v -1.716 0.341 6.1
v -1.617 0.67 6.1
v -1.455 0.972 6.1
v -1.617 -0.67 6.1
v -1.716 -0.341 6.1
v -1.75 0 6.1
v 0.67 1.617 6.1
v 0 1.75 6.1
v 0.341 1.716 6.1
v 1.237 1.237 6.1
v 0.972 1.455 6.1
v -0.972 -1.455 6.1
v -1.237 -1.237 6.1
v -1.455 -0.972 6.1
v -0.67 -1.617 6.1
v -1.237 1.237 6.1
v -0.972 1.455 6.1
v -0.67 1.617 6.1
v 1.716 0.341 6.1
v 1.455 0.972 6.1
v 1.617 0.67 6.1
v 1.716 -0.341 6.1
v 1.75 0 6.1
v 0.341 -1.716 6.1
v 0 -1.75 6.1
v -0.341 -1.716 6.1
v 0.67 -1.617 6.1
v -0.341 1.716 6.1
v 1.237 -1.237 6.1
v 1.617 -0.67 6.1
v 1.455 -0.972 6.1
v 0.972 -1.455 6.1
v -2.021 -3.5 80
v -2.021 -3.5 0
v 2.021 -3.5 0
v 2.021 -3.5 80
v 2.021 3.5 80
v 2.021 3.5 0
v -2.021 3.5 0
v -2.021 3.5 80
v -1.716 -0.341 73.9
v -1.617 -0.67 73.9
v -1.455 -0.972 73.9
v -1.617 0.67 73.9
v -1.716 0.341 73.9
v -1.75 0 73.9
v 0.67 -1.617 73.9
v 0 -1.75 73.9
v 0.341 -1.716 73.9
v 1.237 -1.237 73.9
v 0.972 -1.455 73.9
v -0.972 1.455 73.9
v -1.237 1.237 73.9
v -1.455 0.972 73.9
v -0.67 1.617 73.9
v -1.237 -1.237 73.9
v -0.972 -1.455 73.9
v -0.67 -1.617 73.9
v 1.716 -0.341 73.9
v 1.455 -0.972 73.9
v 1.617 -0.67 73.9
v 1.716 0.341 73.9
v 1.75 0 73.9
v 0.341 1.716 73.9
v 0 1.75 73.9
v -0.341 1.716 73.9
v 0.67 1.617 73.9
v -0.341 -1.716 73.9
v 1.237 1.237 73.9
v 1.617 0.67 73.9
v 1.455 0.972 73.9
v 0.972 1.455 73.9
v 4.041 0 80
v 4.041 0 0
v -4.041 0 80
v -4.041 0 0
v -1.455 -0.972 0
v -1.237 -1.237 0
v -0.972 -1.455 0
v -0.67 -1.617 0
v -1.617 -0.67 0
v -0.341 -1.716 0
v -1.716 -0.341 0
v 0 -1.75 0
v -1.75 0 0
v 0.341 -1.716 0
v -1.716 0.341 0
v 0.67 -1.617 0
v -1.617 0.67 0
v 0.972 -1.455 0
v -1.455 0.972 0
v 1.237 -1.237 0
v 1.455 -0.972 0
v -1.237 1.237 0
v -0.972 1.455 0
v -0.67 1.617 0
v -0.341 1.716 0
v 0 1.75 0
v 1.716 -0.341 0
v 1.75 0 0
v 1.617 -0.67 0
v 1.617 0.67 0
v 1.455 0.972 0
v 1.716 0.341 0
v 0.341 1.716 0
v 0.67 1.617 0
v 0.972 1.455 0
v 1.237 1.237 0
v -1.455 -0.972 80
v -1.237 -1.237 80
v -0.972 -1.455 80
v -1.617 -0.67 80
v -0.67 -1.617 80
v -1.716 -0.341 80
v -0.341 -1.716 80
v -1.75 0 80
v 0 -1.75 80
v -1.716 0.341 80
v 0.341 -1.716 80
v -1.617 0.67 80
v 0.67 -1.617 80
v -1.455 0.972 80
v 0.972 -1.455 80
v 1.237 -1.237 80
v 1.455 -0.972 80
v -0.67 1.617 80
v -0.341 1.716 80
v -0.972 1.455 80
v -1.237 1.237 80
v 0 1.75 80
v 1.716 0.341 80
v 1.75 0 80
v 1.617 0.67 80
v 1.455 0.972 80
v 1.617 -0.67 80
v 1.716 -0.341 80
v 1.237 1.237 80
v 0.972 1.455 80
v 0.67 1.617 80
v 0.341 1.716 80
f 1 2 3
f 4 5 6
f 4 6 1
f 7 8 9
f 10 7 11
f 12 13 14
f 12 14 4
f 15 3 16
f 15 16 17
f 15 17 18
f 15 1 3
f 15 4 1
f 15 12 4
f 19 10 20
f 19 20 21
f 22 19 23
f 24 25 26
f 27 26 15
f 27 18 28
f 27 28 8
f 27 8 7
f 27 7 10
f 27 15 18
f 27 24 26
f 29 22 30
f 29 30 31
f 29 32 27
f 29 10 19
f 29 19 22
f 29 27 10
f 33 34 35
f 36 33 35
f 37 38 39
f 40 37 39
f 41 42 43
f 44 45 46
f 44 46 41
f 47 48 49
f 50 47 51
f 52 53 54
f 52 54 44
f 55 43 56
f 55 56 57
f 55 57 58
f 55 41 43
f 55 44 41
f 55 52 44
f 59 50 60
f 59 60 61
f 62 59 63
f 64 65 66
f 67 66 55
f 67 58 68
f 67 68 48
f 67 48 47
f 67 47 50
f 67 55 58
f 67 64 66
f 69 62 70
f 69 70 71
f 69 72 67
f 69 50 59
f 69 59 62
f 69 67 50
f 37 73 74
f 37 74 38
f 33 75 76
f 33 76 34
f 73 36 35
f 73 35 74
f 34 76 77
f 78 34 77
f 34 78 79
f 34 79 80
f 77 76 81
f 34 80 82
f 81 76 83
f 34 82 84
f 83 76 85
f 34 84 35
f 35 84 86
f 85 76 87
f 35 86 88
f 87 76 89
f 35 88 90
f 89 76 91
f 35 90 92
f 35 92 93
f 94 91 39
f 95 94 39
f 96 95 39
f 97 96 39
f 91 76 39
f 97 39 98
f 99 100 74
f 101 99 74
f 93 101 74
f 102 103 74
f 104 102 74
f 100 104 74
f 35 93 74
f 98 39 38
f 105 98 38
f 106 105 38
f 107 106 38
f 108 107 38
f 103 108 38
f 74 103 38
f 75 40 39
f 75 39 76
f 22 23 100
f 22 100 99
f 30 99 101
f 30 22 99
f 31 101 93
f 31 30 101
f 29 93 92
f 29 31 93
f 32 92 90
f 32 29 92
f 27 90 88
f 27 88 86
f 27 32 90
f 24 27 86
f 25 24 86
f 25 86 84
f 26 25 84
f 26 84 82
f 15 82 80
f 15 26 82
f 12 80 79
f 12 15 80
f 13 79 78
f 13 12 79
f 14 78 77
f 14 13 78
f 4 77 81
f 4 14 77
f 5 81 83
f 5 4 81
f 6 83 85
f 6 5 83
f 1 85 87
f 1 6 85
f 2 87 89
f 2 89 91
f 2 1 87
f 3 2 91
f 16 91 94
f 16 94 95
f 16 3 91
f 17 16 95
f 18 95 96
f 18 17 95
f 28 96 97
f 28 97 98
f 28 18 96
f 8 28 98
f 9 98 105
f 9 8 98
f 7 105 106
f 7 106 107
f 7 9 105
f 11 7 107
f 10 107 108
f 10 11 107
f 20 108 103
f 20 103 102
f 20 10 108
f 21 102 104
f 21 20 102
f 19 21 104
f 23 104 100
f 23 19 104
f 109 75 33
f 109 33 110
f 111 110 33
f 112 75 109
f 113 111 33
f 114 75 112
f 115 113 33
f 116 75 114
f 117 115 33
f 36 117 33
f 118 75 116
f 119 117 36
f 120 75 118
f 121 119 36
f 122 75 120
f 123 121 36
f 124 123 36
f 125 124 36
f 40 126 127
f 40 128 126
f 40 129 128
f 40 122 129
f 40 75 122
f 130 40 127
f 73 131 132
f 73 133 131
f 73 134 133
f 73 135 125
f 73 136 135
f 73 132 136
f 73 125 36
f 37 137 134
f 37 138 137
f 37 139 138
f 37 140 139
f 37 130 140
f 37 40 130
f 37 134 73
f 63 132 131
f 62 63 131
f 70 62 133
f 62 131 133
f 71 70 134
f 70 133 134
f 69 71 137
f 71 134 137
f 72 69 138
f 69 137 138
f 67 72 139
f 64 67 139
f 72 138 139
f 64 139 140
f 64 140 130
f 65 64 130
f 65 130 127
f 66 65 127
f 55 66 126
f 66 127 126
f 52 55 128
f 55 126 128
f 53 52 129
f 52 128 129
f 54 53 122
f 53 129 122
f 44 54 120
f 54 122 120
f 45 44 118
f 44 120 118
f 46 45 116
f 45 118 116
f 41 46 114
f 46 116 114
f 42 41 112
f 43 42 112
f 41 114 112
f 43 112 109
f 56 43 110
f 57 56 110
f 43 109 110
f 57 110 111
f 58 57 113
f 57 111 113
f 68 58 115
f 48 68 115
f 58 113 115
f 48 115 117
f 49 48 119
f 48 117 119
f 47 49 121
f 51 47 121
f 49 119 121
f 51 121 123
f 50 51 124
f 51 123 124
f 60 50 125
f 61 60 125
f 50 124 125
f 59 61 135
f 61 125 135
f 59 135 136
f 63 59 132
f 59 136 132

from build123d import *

# Parameters (mm, degrees)
EXTRUDE_F_DEPTH    = 80
SKETCH2_R          = 1.75
CUT_EXTRUDE1_DEPTH = 6.1
CUT_EXTRUDE2_START = -6.1
SKETCH3_R          = 1.75
CUT_EXTRUDE2_DEPTH = 6.1


with BuildPart() as part:
    # Sketch1 → Extrude f (new body)
    with BuildSketch(Plane.XY):
        Polygon((4.041451884, 0), (2.020725942, 3.5), (-2.020725942, 3.5), (-4.041451884, 0), (-2.020725942, -3.5), (2.020725942, -3.5), align=None)
    extrude(amount=EXTRUDE_F_DEPTH)

    # Sketch2 → Cut-Extrude1 (cut)
    with BuildSketch(Plane.XY.offset(80)):
        Circle(SKETCH2_R)
    extrude(amount=-CUT_EXTRUDE1_DEPTH, mode=Mode.SUBTRACT)

    # Sketch3 → Cut-Extrude2 (cut)
    with BuildSketch(Plane(origin=(0, 0, 0), x_dir=(-1, 0, 0), z_dir=(0, 0, -1)).offset(CUT_EXTRUDE2_START)):
        with Locations(Location((0, 0, 0), (0, 0, 180))):
            Circle(SKETCH3_R)
    extrude(amount=CUT_EXTRUDE2_DEPTH, mode=Mode.SUBTRACT)


solid = part.part
